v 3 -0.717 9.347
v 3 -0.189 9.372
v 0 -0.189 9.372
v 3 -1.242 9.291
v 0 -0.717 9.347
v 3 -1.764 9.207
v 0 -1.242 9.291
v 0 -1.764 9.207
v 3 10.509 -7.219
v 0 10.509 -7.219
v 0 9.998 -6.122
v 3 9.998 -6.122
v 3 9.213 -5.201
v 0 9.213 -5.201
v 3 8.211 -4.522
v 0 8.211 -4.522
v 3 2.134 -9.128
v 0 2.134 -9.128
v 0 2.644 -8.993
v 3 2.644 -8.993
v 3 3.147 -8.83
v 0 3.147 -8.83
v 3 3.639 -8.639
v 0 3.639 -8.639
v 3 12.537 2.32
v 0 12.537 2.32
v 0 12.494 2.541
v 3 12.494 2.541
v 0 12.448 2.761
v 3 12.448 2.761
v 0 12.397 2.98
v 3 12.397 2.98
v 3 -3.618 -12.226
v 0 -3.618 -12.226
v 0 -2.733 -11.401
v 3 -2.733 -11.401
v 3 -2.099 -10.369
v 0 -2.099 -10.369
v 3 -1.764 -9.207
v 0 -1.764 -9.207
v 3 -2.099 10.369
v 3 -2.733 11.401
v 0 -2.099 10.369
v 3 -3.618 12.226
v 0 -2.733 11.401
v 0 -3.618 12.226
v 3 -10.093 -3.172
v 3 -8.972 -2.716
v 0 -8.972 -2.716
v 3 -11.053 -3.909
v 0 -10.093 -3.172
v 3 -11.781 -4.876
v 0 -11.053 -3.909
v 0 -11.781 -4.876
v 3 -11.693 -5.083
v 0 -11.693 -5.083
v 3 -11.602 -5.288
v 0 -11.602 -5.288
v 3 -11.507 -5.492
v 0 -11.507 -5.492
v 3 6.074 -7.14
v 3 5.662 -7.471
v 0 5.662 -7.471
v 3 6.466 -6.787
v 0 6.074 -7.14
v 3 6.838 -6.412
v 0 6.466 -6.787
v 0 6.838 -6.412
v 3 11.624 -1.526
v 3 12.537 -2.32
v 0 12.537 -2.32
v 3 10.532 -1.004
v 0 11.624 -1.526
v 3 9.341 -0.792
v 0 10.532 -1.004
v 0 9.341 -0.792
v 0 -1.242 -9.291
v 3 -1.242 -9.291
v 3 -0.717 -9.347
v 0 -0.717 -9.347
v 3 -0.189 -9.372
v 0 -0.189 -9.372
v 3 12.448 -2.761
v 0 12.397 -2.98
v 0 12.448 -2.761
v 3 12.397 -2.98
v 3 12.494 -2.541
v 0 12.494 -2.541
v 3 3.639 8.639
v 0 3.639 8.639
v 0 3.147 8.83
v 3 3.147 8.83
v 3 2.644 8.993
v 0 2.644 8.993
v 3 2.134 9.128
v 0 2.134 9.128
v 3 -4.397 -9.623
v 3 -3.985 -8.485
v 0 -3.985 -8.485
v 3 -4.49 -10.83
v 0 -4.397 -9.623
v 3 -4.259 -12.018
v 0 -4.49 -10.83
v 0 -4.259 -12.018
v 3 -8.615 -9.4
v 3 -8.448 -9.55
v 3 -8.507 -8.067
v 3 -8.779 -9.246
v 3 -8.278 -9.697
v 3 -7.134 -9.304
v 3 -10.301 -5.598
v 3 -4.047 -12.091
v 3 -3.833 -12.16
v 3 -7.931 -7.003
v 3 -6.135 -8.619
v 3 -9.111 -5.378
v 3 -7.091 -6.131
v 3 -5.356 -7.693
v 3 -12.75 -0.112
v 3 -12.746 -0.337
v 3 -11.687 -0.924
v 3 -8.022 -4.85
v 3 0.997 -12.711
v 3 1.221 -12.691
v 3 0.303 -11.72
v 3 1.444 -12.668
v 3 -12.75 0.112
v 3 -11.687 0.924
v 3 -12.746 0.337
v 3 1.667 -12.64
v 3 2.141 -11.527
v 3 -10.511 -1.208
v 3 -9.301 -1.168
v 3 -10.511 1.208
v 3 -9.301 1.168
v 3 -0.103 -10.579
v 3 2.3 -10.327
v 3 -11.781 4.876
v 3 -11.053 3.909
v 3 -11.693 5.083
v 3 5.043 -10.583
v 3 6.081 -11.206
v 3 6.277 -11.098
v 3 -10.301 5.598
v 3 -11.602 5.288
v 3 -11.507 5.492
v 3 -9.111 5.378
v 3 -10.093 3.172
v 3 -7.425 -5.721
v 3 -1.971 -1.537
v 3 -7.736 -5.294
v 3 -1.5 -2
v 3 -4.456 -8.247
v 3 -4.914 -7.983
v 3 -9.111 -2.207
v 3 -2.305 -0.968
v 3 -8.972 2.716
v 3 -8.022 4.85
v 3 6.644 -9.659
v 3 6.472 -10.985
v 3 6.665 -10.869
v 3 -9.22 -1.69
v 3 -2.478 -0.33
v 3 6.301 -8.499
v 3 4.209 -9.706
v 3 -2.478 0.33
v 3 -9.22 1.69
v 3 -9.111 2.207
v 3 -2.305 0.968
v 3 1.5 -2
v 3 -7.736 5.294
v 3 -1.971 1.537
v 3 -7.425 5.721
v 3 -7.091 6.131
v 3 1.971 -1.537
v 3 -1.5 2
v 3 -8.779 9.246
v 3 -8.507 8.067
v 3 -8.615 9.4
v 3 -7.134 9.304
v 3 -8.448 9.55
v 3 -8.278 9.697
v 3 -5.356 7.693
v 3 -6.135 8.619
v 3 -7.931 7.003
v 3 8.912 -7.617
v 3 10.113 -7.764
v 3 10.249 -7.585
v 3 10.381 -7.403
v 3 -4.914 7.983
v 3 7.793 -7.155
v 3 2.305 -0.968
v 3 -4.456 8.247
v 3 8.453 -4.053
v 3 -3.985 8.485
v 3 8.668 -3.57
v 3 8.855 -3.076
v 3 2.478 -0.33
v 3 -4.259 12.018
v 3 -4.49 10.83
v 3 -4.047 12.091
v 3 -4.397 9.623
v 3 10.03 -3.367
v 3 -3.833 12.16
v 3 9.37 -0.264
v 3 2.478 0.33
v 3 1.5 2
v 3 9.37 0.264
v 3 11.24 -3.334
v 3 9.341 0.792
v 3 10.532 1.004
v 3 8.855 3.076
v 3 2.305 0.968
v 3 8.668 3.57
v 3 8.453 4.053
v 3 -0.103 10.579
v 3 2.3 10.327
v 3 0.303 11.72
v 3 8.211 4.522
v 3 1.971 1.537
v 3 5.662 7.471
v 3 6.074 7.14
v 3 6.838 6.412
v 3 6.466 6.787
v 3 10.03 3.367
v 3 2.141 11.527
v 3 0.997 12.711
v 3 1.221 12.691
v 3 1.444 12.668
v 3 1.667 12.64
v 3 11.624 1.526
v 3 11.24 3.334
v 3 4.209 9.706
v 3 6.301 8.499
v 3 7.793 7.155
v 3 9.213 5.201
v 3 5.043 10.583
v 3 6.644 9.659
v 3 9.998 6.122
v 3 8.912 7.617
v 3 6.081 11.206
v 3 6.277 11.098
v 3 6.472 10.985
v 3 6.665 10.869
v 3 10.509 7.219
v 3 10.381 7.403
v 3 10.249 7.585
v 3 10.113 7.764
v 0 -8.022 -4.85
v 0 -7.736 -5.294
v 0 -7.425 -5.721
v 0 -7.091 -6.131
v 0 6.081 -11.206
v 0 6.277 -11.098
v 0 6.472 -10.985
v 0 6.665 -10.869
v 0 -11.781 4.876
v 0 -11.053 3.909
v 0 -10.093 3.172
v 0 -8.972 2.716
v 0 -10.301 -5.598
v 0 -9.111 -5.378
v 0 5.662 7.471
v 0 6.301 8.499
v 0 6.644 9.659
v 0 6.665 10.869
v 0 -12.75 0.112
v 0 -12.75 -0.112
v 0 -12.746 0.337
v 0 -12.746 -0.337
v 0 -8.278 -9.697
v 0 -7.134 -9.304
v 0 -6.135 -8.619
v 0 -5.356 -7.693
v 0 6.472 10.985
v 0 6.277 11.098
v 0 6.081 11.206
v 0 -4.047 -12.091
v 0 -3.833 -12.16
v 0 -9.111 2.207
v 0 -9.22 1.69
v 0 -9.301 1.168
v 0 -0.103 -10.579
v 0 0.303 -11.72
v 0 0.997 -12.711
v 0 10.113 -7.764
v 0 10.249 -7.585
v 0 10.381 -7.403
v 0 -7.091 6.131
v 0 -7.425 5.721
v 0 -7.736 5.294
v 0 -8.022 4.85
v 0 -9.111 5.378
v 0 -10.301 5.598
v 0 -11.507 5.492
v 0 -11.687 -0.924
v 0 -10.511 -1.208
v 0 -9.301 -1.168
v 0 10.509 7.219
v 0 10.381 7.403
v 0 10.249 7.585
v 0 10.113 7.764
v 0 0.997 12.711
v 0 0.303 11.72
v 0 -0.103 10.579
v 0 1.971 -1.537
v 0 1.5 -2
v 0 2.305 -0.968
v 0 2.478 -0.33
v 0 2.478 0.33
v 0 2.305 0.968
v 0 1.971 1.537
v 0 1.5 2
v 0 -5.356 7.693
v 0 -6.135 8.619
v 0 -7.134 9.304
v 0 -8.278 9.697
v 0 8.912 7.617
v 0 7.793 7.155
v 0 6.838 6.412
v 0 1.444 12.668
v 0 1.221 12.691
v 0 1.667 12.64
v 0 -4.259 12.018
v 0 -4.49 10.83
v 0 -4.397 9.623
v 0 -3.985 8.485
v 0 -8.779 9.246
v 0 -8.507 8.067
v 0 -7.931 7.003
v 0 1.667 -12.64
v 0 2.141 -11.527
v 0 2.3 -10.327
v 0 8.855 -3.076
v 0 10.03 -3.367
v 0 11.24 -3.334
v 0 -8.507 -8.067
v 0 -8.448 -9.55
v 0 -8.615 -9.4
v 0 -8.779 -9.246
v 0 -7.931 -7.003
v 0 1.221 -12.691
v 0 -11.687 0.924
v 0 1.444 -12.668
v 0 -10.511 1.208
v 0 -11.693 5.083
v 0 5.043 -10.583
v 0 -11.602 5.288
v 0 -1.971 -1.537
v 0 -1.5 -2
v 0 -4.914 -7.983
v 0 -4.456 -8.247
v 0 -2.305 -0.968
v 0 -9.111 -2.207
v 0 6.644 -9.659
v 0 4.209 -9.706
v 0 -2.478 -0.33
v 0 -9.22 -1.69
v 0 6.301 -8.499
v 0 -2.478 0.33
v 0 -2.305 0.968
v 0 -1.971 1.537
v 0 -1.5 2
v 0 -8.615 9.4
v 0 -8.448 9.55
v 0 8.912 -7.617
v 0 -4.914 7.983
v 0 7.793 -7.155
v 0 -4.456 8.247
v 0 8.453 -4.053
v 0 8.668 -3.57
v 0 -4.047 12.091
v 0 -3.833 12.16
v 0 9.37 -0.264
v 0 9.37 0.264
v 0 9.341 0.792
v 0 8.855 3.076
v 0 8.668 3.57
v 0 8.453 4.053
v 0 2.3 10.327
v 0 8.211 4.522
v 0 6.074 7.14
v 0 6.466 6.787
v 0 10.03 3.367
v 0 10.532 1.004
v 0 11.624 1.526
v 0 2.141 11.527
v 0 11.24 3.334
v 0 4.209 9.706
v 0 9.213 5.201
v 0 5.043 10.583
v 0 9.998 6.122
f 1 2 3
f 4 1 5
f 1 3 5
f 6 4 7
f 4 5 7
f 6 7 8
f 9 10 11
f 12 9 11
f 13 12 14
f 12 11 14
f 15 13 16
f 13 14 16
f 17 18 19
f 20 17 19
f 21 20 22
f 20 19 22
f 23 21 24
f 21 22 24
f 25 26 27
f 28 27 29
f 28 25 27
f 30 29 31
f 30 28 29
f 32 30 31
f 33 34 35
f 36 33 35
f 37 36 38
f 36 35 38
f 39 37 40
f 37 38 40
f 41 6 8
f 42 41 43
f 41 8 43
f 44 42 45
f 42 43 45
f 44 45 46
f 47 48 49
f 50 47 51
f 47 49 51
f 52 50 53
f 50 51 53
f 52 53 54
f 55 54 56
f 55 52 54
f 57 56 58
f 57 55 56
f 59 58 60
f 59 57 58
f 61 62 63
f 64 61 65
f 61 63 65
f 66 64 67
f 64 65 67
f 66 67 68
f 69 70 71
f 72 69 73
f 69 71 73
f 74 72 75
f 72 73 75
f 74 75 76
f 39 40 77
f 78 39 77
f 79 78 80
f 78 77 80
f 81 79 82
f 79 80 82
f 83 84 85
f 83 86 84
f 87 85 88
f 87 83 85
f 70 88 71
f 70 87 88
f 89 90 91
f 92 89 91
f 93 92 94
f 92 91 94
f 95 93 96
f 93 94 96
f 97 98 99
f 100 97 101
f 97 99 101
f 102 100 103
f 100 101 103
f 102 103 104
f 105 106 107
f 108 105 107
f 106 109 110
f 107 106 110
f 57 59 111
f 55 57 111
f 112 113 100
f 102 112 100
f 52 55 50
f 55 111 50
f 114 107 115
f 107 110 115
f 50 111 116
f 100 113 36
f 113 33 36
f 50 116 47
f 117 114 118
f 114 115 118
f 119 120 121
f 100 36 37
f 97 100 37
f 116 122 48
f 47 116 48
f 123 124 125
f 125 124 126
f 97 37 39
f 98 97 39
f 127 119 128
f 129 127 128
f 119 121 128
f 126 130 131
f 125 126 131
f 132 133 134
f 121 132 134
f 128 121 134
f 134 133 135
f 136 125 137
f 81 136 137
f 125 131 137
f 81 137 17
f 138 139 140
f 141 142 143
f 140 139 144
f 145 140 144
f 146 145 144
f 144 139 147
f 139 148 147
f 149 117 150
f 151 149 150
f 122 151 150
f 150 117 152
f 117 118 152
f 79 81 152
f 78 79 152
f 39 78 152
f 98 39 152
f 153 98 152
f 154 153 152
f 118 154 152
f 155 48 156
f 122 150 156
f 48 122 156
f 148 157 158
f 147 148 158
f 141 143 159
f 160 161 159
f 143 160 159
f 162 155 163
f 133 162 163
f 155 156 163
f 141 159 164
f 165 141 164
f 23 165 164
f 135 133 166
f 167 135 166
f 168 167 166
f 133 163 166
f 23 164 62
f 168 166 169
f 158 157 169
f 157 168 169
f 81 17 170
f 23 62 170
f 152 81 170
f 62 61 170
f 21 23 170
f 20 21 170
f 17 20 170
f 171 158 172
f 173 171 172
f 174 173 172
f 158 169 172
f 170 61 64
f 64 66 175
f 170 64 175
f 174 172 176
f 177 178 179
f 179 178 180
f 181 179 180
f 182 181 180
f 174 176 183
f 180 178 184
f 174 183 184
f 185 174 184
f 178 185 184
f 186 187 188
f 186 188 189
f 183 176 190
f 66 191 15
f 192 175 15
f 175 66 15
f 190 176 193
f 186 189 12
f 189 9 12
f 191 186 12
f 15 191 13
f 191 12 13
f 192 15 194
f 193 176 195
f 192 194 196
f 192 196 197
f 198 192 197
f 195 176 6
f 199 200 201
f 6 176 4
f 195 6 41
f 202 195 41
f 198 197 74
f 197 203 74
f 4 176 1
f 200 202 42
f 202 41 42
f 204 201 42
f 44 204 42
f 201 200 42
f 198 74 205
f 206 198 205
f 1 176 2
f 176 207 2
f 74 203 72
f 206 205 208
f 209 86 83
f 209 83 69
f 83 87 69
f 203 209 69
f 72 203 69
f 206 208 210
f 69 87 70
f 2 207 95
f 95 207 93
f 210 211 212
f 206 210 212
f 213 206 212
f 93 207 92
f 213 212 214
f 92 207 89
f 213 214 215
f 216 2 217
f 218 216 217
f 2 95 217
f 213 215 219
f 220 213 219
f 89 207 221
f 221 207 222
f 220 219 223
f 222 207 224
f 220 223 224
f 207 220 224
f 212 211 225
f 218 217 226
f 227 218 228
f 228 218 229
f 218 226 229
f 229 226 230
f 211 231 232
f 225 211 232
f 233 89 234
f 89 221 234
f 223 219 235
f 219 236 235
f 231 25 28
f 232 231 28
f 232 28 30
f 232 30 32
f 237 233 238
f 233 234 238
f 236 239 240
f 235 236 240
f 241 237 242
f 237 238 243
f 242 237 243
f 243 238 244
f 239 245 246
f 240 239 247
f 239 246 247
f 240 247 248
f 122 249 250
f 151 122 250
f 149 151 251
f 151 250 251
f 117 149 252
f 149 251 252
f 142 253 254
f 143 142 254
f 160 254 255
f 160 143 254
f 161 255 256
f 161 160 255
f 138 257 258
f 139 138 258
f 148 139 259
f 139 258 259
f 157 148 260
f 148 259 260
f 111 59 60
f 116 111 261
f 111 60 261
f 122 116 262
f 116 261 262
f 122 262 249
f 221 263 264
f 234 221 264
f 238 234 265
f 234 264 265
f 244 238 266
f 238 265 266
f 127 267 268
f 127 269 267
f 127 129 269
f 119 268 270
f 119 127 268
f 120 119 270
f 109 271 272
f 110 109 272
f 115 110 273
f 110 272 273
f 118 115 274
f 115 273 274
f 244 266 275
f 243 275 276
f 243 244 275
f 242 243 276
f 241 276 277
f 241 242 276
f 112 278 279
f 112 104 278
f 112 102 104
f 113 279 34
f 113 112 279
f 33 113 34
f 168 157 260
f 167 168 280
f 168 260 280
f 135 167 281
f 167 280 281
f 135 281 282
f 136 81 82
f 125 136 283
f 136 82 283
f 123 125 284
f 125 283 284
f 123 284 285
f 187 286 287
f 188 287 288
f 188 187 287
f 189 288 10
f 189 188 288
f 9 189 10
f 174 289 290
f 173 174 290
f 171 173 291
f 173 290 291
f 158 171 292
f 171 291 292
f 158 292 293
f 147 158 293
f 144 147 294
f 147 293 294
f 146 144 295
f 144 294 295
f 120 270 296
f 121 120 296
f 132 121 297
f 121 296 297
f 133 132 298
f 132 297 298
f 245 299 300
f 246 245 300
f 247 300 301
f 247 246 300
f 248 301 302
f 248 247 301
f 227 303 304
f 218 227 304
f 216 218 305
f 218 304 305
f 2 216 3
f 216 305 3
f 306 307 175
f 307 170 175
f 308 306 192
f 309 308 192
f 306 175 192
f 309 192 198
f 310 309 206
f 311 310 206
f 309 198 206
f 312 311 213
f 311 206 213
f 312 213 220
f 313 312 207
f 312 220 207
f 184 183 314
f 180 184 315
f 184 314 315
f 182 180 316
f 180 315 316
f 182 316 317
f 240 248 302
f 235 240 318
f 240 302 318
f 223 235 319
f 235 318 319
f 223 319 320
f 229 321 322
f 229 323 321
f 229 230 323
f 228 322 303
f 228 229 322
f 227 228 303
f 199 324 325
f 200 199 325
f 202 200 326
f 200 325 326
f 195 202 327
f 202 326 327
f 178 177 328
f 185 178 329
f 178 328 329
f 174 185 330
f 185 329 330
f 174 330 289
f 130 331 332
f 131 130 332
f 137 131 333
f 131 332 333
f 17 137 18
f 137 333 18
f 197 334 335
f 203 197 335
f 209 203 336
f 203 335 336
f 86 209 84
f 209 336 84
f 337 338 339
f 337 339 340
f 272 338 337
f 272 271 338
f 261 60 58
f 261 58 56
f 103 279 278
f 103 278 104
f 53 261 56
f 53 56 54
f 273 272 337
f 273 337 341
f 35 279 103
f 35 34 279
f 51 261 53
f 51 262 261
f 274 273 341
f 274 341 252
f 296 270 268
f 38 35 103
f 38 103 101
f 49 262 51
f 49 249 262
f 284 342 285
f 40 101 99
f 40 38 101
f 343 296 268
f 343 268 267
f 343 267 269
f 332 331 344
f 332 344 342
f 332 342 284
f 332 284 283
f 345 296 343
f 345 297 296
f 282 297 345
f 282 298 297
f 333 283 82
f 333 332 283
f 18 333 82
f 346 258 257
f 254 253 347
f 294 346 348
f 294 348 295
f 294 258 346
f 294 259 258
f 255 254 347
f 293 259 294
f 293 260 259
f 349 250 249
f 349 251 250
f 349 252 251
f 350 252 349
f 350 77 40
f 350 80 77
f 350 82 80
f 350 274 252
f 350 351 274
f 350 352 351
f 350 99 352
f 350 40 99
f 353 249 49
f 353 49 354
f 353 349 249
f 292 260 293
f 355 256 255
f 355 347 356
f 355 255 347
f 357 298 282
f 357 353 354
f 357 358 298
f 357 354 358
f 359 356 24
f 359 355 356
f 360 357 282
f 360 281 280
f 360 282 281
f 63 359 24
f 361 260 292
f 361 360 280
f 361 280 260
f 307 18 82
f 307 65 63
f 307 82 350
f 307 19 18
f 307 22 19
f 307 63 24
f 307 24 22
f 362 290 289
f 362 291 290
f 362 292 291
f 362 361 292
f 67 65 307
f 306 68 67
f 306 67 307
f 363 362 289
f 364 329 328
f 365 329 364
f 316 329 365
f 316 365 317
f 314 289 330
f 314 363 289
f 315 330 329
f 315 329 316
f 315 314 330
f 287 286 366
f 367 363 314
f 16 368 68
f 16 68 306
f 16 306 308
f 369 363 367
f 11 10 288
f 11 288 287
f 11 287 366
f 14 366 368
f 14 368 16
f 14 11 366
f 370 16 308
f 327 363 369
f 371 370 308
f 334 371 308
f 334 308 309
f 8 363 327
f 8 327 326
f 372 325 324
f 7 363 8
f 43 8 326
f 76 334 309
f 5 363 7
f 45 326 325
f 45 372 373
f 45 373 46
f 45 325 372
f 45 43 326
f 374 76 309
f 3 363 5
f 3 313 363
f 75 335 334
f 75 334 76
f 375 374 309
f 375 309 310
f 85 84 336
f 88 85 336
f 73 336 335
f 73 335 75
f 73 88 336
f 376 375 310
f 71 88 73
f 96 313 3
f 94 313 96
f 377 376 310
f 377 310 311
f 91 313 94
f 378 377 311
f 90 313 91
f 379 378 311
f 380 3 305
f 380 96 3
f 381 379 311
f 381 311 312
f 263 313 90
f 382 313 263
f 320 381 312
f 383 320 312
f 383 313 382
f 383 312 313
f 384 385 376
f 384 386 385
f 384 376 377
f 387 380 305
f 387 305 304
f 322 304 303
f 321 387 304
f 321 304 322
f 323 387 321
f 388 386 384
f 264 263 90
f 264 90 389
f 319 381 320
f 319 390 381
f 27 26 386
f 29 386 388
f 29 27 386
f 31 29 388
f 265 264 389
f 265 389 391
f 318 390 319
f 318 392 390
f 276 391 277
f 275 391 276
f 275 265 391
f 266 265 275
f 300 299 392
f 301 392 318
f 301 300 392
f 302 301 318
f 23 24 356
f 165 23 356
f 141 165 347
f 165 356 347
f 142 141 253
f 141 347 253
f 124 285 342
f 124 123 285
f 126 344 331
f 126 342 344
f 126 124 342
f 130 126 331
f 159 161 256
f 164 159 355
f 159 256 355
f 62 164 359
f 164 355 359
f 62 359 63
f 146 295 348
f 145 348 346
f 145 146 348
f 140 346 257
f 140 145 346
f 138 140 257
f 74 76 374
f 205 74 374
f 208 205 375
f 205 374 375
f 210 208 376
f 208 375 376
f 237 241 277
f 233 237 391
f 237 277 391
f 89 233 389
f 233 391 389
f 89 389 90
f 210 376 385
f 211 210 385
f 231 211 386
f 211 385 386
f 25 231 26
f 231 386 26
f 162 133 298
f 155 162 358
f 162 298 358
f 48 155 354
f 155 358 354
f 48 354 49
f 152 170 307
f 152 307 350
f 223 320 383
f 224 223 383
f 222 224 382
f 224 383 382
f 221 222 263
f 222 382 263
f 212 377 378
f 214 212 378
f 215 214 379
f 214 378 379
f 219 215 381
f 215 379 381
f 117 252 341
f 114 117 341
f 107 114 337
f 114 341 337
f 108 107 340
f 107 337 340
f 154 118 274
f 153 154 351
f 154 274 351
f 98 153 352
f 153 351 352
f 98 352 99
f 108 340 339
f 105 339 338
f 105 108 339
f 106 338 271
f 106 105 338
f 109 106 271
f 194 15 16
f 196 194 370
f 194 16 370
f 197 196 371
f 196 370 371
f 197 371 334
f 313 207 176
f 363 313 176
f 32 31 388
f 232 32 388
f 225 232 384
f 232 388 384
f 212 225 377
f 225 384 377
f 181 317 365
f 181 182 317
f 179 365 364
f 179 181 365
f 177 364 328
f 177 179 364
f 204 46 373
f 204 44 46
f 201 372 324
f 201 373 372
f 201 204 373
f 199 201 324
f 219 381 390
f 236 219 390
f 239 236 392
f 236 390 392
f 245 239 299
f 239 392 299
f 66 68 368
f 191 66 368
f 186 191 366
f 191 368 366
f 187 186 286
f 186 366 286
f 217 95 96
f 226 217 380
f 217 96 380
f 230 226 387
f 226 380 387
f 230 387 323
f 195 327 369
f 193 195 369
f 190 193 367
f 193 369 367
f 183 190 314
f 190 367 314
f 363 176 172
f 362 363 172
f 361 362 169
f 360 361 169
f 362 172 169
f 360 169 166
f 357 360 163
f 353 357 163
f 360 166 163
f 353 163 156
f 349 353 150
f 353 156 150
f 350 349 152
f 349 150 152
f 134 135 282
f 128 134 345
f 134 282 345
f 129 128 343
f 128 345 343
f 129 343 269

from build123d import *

# Parameters (mm, degrees)
BASPROSKE_W        = 3
BASPROSKE_H        = 12.75
TOOTHCUT_DEPTH     = 19.27908641
TEETHCUTS_COUNT    = 15
TEETHCUTS_ANGLE    = 336
BORSKE_R           = 2.5
BORE_DEPTH         = 50.0000508
BOSS_EXTRU_1_DEPTH = 3


with BuildPart() as part:
    # BasProSke → Base-Revolve (revolve)
    with BuildSketch(Plane(origin=(0, 0, 0), x_dir=(1, 0, 0), z_dir=(0, 1, 0)), mode=Mode.PRIVATE) as base_revolve_sk:
        with Locations((1.5, 6.375)):
            Rectangle(BASPROSKE_W, BASPROSKE_H)
    revolve(base_revolve_sk.sketch.rotate(Axis((-10, 0, 0), (1, 0, 0)), 180), axis=Axis((-10, 0, 0), (1, 0, 0)))

    # TooCutSke → ToothCut (cut, through all)
    with BuildSketch(Plane(origin=(0, 0, 0), x_dir=(0, 0, -1), z_dir=(1, 0, 0))):
        with BuildLine():
            ThreePointArc((0.791546546, 9.340520867), (0, 9.374), (-0.791546546, 9.340520867))
            ThreePointArc((-0.791546546, 9.340520867), (-1.235070734, 11.110218102), (-2.344732916, 12.558386549))
            ThreePointArc((-2.344732916, 12.558386549), (0, 12.7754), (2.344732916, 12.558386549))
            ThreePointArc((2.344732916, 12.558386549), (1.235070734, 11.110218102), (0.791546546, 9.340520867))
        make_face()
    toothcut = extrude(amount=TOOTHCUT_DEPTH, mode=Mode.SUBTRACT)

    # TeethCuts: ToothCut ×15 about axis
    teethcuts_axis = Axis((-10, 0, 0), (1, 0, 0))
    for i in range(1, TEETHCUTS_COUNT):
        add(toothcut.rotate(teethcuts_axis, i * TEETHCUTS_ANGLE / (TEETHCUTS_COUNT - 1)), mode=Mode.SUBTRACT)

    # BorSke → Bore (cut, symmetric)
    with BuildSketch(Plane(origin=(0, 0, 0), x_dir=(0, 0, -1), z_dir=(1, 0, 0))):
        with Locations(Location((0, 0, 0), (0, 0, 180))):
            Circle(BORSKE_R)
    extrude(amount=BORE_DEPTH, both=True, mode=Mode.SUBTRACT)

    # Esquisse1 → Boss.-Extru.1 (add)
    with BuildSketch(Plane(origin=(3, 0, 0), x_dir=(0, 0, -1), z_dir=(1, 0, 0))):
        with BuildLine():
            Line((-2, 1.5), (-2, -1.5))
            ThreePointArc((-2, -1.5), (-2.5, 0), (-2, 1.5))
        make_face()
        with BuildLine():
            Line((2, 1.5), (2, -1.5))
            ThreePointArc((2, -1.5), (2.5, 0), (2, 1.5))
        make_face()
    extrude(amount=-BOSS_EXTRU_1_DEPTH)


solid = part.part
